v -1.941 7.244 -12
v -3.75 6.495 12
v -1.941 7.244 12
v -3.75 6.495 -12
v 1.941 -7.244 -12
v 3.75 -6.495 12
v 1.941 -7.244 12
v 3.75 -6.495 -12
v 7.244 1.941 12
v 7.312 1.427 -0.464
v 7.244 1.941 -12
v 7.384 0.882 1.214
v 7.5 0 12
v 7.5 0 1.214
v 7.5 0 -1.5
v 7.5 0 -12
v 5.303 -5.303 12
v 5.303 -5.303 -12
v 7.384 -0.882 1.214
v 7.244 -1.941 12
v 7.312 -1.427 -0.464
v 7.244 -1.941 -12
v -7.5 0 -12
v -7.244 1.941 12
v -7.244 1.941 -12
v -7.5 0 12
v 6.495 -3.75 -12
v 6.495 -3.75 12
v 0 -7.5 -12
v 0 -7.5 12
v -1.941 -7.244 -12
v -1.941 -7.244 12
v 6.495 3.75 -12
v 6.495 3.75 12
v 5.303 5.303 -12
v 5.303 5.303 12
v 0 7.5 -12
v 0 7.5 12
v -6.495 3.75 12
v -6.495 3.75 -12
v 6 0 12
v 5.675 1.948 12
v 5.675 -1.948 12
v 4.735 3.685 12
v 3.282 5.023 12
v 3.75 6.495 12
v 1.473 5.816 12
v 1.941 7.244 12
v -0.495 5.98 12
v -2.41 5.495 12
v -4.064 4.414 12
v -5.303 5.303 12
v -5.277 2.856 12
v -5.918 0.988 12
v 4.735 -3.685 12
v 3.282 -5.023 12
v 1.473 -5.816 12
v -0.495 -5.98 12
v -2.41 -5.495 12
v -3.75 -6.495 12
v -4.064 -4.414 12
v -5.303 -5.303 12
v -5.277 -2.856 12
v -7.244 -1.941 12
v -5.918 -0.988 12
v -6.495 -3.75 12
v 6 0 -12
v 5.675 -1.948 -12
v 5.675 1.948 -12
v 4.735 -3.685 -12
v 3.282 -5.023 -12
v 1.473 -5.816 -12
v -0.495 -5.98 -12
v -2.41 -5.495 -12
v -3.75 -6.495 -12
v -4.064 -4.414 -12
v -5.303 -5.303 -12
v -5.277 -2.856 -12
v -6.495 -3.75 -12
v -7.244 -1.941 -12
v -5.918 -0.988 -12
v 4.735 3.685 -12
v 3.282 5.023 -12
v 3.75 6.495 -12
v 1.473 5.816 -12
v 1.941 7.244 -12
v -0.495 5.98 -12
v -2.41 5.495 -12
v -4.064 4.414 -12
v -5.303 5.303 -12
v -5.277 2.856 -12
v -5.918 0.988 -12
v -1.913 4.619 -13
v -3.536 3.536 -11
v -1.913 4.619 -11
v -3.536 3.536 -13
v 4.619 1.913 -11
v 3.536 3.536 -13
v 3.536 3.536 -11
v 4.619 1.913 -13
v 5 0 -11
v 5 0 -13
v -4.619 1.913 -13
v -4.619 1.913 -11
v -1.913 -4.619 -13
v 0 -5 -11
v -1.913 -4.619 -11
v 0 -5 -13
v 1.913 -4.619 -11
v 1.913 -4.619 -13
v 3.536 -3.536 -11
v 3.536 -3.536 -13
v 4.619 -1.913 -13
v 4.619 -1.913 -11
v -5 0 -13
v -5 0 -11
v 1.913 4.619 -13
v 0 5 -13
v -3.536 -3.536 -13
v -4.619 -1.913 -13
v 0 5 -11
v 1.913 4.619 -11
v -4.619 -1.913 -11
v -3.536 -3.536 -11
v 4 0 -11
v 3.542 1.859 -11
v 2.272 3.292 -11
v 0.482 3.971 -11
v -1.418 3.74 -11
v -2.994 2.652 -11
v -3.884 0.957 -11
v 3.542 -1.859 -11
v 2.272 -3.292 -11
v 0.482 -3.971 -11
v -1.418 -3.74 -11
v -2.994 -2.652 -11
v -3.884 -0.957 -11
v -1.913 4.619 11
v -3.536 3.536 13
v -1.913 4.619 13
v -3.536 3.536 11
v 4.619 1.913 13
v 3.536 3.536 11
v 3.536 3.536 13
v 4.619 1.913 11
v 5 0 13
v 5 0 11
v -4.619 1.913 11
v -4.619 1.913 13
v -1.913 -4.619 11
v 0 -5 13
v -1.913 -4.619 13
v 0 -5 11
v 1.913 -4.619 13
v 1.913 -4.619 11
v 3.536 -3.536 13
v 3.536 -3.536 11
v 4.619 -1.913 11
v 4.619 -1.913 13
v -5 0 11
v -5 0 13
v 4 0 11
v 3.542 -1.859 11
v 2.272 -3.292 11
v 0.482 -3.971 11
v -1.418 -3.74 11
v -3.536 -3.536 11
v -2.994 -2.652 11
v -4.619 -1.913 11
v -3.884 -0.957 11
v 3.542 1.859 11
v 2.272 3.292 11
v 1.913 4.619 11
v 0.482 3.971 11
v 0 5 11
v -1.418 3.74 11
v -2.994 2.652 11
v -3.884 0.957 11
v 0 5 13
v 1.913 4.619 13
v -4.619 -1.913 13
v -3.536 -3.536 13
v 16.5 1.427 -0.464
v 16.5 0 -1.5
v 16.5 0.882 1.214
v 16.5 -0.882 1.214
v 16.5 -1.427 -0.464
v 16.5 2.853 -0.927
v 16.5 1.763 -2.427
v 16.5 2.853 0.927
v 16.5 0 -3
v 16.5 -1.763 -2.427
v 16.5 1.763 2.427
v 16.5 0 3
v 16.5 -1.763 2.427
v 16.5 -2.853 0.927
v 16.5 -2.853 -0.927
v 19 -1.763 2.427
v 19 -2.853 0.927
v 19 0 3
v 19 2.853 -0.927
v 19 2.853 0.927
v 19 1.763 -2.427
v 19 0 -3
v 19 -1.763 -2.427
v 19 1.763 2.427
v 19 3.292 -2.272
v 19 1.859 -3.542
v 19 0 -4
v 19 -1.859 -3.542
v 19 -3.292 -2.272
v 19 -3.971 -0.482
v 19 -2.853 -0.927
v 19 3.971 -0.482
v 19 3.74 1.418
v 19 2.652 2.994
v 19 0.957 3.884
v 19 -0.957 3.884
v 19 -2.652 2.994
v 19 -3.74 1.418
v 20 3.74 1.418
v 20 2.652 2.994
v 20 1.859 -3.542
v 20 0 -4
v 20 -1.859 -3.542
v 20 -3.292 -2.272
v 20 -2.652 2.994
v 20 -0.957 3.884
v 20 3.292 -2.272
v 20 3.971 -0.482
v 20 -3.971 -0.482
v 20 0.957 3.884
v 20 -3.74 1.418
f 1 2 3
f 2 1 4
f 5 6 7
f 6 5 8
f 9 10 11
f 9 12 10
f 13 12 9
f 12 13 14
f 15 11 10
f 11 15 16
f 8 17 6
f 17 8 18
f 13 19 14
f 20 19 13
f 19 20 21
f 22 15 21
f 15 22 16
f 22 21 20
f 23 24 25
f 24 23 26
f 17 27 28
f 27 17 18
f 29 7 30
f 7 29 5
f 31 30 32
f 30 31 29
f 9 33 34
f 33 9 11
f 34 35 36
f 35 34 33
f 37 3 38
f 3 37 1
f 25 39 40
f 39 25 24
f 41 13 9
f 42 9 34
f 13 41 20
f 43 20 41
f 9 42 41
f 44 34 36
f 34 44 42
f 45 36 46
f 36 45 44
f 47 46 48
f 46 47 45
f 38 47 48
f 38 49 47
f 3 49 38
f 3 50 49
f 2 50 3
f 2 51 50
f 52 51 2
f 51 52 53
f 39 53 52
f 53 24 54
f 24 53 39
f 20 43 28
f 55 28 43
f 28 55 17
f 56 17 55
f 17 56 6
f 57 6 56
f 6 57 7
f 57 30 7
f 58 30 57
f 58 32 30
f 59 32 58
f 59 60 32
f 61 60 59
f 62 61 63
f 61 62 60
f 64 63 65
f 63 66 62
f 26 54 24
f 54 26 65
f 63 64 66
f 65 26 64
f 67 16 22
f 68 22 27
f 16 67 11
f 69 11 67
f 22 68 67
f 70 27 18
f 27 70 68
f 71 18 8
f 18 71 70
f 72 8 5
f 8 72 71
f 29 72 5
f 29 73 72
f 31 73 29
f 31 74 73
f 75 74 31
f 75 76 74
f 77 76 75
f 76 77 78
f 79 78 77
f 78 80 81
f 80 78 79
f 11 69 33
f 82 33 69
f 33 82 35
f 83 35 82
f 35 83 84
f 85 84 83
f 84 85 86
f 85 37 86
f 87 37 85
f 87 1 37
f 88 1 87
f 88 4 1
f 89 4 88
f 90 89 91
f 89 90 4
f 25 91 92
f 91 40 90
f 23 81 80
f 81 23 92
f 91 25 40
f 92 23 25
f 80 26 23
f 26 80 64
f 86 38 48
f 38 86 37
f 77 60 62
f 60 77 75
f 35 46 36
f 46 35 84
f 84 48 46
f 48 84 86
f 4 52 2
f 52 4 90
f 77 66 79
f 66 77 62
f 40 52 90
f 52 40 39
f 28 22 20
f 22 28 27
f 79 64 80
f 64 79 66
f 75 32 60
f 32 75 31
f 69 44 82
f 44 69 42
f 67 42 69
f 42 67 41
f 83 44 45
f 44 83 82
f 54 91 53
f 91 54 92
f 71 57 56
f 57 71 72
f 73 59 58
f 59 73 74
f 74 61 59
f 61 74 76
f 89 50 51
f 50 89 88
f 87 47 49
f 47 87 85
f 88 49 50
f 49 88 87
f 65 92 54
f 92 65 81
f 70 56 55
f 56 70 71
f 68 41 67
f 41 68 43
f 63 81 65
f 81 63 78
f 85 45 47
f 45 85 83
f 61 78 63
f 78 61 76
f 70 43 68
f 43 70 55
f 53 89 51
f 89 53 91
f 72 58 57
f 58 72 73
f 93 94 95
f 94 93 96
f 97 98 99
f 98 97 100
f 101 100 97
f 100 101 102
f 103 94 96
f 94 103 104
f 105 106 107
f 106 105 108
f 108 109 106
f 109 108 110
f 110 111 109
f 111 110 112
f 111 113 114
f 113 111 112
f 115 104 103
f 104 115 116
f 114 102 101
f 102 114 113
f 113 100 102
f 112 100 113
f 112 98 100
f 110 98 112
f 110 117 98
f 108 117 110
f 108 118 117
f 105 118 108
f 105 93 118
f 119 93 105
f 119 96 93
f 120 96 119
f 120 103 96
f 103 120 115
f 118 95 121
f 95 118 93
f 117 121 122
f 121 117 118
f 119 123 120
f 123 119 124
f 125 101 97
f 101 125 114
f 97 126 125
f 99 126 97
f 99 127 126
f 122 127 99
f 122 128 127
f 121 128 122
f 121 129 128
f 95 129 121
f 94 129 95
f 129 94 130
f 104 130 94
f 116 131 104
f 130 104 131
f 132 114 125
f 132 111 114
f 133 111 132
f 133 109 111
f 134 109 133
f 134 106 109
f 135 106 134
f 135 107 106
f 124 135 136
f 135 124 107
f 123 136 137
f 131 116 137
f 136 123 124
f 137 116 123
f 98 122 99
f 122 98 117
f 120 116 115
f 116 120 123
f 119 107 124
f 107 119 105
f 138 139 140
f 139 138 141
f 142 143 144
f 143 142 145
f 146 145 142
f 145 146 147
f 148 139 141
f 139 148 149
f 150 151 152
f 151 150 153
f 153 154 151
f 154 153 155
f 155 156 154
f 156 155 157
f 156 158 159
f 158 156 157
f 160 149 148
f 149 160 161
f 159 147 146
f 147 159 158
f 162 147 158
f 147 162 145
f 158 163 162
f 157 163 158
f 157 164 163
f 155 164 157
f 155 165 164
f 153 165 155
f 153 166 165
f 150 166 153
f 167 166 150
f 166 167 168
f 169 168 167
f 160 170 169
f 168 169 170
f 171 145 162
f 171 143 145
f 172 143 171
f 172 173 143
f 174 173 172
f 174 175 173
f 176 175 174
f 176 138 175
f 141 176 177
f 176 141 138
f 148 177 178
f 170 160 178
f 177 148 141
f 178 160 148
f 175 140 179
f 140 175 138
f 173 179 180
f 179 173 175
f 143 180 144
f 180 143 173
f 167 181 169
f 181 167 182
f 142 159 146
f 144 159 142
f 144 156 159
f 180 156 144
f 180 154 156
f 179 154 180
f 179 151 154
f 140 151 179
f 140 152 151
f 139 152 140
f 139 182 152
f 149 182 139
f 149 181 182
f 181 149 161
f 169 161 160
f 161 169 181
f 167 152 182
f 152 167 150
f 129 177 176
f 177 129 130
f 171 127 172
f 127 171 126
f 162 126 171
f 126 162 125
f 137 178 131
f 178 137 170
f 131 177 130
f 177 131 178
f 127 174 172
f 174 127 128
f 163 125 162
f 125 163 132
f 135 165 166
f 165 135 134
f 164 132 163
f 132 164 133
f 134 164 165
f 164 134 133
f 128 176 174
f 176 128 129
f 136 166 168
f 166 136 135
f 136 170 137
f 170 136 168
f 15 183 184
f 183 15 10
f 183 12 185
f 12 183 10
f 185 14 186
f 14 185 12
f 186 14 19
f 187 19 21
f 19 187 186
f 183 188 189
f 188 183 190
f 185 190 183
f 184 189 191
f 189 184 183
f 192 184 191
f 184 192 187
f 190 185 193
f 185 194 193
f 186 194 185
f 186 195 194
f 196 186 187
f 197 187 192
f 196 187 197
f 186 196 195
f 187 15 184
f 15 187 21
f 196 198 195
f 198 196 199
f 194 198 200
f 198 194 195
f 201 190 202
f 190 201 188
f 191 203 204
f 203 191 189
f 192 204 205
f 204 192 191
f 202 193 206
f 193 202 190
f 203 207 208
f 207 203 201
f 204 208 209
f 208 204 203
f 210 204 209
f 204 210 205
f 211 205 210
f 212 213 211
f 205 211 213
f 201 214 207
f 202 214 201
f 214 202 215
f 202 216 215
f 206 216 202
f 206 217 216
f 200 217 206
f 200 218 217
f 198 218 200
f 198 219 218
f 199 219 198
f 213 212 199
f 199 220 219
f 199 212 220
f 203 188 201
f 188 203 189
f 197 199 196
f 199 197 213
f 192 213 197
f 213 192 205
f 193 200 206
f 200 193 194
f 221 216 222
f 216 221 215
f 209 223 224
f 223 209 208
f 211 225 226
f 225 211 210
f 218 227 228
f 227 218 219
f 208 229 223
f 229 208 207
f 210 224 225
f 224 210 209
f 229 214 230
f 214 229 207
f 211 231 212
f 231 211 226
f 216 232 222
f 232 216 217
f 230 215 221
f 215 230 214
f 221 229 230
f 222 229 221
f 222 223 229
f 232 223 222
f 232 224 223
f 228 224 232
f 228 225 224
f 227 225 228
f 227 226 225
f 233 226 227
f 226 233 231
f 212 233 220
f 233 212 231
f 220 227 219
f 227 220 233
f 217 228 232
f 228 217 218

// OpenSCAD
// Parameters
bore_diameter_mm = 8; //[4:16:0.1]
outer_diameter_mm = 15; //[8:30:0.1]
length_mm = 24; //[12:48:0.1]
casing_wall_thickness_mm = 1.5; //[0.8:3:0.1]
seal_length_mm = 2; //[1:4:0.1]
seal_radial_thickness_mm = 1; //[0.5:2:0.1]
overlap_mm = 1; //[0.5:2:0.1]
screw_shank_diameter_mm = 3; //[2:6:0.1]
screw_length_mm = 10; //[6:20:0.1]
screw_head_diameter_mm = 6; //[4:12:0.1]
screw_head_height_mm = 2.5; //[1.5:5:0.1]
washer_outer_diameter_mm = 8; //[6:16:0.1]
washer_thickness_mm = 1; //[0.5:2:0.1]

// Linear Bearing - complete geometry
module linear_bearing() {
  color([0.85, 0.85, 0.8]) {
    // Outer casing
    difference() {
      cylinder(r=outer_diameter_mm/2, h=length_mm, center=true);
      cylinder(r=outer_diameter_mm/2 - casing_wall_thickness_mm, h=length_mm + 2*overlap_mm, center=true);
    }
    // End seals
    translate([0, 0, -length_mm/2 + seal_length_mm/2 - overlap_mm])
      cylinder(r=bore_diameter_mm/2 + seal_radial_thickness_mm, h=seal_length_mm, center=true);
    translate([0, 0, length_mm/2 - seal_length_mm/2 + overlap_mm])
      cylinder(r=bore_diameter_mm/2 + seal_radial_thickness_mm, h=seal_length_mm, center=true);
    // Inner bore
    difference() {
      cylinder(r=bore_diameter_mm/2, h=length_mm + 2*overlap_mm, center=true);
    }
  }
}

// Screw and Washer - complete geometry
module screw_and_washer() {
  color("Silver") {
    // Screw shank
    translate([outer_diameter_mm/2 + screw_length_mm/2 - overlap_mm, 0, 0])
      rotate([0, 90, 0])
      cylinder(r=screw_shank_diameter_mm/2, h=screw_length_mm, center=true);
    // Screw head
    translate([outer_diameter_mm/2 + screw_length_mm + screw_head_height_mm/2 - overlap_mm, 0, 0])
      rotate([0, 90, 0])
      cylinder(r=screw_head_diameter_mm/2, h=screw_head_height_mm, center=true);
    // Washer
    translate([outer_diameter_mm/2 + screw_length_mm + screw_head_height_mm + washer_thickness_mm/2 - overlap_mm, 0, 0])
      rotate([0, 90, 0])
      cylinder(r=washer_outer_diameter_mm/2, h=washer_thickness_mm, center=true);
  }
}

// Assembly
module assembly() {
  linear_bearing();
  screw_and_washer();
}

assembly();
